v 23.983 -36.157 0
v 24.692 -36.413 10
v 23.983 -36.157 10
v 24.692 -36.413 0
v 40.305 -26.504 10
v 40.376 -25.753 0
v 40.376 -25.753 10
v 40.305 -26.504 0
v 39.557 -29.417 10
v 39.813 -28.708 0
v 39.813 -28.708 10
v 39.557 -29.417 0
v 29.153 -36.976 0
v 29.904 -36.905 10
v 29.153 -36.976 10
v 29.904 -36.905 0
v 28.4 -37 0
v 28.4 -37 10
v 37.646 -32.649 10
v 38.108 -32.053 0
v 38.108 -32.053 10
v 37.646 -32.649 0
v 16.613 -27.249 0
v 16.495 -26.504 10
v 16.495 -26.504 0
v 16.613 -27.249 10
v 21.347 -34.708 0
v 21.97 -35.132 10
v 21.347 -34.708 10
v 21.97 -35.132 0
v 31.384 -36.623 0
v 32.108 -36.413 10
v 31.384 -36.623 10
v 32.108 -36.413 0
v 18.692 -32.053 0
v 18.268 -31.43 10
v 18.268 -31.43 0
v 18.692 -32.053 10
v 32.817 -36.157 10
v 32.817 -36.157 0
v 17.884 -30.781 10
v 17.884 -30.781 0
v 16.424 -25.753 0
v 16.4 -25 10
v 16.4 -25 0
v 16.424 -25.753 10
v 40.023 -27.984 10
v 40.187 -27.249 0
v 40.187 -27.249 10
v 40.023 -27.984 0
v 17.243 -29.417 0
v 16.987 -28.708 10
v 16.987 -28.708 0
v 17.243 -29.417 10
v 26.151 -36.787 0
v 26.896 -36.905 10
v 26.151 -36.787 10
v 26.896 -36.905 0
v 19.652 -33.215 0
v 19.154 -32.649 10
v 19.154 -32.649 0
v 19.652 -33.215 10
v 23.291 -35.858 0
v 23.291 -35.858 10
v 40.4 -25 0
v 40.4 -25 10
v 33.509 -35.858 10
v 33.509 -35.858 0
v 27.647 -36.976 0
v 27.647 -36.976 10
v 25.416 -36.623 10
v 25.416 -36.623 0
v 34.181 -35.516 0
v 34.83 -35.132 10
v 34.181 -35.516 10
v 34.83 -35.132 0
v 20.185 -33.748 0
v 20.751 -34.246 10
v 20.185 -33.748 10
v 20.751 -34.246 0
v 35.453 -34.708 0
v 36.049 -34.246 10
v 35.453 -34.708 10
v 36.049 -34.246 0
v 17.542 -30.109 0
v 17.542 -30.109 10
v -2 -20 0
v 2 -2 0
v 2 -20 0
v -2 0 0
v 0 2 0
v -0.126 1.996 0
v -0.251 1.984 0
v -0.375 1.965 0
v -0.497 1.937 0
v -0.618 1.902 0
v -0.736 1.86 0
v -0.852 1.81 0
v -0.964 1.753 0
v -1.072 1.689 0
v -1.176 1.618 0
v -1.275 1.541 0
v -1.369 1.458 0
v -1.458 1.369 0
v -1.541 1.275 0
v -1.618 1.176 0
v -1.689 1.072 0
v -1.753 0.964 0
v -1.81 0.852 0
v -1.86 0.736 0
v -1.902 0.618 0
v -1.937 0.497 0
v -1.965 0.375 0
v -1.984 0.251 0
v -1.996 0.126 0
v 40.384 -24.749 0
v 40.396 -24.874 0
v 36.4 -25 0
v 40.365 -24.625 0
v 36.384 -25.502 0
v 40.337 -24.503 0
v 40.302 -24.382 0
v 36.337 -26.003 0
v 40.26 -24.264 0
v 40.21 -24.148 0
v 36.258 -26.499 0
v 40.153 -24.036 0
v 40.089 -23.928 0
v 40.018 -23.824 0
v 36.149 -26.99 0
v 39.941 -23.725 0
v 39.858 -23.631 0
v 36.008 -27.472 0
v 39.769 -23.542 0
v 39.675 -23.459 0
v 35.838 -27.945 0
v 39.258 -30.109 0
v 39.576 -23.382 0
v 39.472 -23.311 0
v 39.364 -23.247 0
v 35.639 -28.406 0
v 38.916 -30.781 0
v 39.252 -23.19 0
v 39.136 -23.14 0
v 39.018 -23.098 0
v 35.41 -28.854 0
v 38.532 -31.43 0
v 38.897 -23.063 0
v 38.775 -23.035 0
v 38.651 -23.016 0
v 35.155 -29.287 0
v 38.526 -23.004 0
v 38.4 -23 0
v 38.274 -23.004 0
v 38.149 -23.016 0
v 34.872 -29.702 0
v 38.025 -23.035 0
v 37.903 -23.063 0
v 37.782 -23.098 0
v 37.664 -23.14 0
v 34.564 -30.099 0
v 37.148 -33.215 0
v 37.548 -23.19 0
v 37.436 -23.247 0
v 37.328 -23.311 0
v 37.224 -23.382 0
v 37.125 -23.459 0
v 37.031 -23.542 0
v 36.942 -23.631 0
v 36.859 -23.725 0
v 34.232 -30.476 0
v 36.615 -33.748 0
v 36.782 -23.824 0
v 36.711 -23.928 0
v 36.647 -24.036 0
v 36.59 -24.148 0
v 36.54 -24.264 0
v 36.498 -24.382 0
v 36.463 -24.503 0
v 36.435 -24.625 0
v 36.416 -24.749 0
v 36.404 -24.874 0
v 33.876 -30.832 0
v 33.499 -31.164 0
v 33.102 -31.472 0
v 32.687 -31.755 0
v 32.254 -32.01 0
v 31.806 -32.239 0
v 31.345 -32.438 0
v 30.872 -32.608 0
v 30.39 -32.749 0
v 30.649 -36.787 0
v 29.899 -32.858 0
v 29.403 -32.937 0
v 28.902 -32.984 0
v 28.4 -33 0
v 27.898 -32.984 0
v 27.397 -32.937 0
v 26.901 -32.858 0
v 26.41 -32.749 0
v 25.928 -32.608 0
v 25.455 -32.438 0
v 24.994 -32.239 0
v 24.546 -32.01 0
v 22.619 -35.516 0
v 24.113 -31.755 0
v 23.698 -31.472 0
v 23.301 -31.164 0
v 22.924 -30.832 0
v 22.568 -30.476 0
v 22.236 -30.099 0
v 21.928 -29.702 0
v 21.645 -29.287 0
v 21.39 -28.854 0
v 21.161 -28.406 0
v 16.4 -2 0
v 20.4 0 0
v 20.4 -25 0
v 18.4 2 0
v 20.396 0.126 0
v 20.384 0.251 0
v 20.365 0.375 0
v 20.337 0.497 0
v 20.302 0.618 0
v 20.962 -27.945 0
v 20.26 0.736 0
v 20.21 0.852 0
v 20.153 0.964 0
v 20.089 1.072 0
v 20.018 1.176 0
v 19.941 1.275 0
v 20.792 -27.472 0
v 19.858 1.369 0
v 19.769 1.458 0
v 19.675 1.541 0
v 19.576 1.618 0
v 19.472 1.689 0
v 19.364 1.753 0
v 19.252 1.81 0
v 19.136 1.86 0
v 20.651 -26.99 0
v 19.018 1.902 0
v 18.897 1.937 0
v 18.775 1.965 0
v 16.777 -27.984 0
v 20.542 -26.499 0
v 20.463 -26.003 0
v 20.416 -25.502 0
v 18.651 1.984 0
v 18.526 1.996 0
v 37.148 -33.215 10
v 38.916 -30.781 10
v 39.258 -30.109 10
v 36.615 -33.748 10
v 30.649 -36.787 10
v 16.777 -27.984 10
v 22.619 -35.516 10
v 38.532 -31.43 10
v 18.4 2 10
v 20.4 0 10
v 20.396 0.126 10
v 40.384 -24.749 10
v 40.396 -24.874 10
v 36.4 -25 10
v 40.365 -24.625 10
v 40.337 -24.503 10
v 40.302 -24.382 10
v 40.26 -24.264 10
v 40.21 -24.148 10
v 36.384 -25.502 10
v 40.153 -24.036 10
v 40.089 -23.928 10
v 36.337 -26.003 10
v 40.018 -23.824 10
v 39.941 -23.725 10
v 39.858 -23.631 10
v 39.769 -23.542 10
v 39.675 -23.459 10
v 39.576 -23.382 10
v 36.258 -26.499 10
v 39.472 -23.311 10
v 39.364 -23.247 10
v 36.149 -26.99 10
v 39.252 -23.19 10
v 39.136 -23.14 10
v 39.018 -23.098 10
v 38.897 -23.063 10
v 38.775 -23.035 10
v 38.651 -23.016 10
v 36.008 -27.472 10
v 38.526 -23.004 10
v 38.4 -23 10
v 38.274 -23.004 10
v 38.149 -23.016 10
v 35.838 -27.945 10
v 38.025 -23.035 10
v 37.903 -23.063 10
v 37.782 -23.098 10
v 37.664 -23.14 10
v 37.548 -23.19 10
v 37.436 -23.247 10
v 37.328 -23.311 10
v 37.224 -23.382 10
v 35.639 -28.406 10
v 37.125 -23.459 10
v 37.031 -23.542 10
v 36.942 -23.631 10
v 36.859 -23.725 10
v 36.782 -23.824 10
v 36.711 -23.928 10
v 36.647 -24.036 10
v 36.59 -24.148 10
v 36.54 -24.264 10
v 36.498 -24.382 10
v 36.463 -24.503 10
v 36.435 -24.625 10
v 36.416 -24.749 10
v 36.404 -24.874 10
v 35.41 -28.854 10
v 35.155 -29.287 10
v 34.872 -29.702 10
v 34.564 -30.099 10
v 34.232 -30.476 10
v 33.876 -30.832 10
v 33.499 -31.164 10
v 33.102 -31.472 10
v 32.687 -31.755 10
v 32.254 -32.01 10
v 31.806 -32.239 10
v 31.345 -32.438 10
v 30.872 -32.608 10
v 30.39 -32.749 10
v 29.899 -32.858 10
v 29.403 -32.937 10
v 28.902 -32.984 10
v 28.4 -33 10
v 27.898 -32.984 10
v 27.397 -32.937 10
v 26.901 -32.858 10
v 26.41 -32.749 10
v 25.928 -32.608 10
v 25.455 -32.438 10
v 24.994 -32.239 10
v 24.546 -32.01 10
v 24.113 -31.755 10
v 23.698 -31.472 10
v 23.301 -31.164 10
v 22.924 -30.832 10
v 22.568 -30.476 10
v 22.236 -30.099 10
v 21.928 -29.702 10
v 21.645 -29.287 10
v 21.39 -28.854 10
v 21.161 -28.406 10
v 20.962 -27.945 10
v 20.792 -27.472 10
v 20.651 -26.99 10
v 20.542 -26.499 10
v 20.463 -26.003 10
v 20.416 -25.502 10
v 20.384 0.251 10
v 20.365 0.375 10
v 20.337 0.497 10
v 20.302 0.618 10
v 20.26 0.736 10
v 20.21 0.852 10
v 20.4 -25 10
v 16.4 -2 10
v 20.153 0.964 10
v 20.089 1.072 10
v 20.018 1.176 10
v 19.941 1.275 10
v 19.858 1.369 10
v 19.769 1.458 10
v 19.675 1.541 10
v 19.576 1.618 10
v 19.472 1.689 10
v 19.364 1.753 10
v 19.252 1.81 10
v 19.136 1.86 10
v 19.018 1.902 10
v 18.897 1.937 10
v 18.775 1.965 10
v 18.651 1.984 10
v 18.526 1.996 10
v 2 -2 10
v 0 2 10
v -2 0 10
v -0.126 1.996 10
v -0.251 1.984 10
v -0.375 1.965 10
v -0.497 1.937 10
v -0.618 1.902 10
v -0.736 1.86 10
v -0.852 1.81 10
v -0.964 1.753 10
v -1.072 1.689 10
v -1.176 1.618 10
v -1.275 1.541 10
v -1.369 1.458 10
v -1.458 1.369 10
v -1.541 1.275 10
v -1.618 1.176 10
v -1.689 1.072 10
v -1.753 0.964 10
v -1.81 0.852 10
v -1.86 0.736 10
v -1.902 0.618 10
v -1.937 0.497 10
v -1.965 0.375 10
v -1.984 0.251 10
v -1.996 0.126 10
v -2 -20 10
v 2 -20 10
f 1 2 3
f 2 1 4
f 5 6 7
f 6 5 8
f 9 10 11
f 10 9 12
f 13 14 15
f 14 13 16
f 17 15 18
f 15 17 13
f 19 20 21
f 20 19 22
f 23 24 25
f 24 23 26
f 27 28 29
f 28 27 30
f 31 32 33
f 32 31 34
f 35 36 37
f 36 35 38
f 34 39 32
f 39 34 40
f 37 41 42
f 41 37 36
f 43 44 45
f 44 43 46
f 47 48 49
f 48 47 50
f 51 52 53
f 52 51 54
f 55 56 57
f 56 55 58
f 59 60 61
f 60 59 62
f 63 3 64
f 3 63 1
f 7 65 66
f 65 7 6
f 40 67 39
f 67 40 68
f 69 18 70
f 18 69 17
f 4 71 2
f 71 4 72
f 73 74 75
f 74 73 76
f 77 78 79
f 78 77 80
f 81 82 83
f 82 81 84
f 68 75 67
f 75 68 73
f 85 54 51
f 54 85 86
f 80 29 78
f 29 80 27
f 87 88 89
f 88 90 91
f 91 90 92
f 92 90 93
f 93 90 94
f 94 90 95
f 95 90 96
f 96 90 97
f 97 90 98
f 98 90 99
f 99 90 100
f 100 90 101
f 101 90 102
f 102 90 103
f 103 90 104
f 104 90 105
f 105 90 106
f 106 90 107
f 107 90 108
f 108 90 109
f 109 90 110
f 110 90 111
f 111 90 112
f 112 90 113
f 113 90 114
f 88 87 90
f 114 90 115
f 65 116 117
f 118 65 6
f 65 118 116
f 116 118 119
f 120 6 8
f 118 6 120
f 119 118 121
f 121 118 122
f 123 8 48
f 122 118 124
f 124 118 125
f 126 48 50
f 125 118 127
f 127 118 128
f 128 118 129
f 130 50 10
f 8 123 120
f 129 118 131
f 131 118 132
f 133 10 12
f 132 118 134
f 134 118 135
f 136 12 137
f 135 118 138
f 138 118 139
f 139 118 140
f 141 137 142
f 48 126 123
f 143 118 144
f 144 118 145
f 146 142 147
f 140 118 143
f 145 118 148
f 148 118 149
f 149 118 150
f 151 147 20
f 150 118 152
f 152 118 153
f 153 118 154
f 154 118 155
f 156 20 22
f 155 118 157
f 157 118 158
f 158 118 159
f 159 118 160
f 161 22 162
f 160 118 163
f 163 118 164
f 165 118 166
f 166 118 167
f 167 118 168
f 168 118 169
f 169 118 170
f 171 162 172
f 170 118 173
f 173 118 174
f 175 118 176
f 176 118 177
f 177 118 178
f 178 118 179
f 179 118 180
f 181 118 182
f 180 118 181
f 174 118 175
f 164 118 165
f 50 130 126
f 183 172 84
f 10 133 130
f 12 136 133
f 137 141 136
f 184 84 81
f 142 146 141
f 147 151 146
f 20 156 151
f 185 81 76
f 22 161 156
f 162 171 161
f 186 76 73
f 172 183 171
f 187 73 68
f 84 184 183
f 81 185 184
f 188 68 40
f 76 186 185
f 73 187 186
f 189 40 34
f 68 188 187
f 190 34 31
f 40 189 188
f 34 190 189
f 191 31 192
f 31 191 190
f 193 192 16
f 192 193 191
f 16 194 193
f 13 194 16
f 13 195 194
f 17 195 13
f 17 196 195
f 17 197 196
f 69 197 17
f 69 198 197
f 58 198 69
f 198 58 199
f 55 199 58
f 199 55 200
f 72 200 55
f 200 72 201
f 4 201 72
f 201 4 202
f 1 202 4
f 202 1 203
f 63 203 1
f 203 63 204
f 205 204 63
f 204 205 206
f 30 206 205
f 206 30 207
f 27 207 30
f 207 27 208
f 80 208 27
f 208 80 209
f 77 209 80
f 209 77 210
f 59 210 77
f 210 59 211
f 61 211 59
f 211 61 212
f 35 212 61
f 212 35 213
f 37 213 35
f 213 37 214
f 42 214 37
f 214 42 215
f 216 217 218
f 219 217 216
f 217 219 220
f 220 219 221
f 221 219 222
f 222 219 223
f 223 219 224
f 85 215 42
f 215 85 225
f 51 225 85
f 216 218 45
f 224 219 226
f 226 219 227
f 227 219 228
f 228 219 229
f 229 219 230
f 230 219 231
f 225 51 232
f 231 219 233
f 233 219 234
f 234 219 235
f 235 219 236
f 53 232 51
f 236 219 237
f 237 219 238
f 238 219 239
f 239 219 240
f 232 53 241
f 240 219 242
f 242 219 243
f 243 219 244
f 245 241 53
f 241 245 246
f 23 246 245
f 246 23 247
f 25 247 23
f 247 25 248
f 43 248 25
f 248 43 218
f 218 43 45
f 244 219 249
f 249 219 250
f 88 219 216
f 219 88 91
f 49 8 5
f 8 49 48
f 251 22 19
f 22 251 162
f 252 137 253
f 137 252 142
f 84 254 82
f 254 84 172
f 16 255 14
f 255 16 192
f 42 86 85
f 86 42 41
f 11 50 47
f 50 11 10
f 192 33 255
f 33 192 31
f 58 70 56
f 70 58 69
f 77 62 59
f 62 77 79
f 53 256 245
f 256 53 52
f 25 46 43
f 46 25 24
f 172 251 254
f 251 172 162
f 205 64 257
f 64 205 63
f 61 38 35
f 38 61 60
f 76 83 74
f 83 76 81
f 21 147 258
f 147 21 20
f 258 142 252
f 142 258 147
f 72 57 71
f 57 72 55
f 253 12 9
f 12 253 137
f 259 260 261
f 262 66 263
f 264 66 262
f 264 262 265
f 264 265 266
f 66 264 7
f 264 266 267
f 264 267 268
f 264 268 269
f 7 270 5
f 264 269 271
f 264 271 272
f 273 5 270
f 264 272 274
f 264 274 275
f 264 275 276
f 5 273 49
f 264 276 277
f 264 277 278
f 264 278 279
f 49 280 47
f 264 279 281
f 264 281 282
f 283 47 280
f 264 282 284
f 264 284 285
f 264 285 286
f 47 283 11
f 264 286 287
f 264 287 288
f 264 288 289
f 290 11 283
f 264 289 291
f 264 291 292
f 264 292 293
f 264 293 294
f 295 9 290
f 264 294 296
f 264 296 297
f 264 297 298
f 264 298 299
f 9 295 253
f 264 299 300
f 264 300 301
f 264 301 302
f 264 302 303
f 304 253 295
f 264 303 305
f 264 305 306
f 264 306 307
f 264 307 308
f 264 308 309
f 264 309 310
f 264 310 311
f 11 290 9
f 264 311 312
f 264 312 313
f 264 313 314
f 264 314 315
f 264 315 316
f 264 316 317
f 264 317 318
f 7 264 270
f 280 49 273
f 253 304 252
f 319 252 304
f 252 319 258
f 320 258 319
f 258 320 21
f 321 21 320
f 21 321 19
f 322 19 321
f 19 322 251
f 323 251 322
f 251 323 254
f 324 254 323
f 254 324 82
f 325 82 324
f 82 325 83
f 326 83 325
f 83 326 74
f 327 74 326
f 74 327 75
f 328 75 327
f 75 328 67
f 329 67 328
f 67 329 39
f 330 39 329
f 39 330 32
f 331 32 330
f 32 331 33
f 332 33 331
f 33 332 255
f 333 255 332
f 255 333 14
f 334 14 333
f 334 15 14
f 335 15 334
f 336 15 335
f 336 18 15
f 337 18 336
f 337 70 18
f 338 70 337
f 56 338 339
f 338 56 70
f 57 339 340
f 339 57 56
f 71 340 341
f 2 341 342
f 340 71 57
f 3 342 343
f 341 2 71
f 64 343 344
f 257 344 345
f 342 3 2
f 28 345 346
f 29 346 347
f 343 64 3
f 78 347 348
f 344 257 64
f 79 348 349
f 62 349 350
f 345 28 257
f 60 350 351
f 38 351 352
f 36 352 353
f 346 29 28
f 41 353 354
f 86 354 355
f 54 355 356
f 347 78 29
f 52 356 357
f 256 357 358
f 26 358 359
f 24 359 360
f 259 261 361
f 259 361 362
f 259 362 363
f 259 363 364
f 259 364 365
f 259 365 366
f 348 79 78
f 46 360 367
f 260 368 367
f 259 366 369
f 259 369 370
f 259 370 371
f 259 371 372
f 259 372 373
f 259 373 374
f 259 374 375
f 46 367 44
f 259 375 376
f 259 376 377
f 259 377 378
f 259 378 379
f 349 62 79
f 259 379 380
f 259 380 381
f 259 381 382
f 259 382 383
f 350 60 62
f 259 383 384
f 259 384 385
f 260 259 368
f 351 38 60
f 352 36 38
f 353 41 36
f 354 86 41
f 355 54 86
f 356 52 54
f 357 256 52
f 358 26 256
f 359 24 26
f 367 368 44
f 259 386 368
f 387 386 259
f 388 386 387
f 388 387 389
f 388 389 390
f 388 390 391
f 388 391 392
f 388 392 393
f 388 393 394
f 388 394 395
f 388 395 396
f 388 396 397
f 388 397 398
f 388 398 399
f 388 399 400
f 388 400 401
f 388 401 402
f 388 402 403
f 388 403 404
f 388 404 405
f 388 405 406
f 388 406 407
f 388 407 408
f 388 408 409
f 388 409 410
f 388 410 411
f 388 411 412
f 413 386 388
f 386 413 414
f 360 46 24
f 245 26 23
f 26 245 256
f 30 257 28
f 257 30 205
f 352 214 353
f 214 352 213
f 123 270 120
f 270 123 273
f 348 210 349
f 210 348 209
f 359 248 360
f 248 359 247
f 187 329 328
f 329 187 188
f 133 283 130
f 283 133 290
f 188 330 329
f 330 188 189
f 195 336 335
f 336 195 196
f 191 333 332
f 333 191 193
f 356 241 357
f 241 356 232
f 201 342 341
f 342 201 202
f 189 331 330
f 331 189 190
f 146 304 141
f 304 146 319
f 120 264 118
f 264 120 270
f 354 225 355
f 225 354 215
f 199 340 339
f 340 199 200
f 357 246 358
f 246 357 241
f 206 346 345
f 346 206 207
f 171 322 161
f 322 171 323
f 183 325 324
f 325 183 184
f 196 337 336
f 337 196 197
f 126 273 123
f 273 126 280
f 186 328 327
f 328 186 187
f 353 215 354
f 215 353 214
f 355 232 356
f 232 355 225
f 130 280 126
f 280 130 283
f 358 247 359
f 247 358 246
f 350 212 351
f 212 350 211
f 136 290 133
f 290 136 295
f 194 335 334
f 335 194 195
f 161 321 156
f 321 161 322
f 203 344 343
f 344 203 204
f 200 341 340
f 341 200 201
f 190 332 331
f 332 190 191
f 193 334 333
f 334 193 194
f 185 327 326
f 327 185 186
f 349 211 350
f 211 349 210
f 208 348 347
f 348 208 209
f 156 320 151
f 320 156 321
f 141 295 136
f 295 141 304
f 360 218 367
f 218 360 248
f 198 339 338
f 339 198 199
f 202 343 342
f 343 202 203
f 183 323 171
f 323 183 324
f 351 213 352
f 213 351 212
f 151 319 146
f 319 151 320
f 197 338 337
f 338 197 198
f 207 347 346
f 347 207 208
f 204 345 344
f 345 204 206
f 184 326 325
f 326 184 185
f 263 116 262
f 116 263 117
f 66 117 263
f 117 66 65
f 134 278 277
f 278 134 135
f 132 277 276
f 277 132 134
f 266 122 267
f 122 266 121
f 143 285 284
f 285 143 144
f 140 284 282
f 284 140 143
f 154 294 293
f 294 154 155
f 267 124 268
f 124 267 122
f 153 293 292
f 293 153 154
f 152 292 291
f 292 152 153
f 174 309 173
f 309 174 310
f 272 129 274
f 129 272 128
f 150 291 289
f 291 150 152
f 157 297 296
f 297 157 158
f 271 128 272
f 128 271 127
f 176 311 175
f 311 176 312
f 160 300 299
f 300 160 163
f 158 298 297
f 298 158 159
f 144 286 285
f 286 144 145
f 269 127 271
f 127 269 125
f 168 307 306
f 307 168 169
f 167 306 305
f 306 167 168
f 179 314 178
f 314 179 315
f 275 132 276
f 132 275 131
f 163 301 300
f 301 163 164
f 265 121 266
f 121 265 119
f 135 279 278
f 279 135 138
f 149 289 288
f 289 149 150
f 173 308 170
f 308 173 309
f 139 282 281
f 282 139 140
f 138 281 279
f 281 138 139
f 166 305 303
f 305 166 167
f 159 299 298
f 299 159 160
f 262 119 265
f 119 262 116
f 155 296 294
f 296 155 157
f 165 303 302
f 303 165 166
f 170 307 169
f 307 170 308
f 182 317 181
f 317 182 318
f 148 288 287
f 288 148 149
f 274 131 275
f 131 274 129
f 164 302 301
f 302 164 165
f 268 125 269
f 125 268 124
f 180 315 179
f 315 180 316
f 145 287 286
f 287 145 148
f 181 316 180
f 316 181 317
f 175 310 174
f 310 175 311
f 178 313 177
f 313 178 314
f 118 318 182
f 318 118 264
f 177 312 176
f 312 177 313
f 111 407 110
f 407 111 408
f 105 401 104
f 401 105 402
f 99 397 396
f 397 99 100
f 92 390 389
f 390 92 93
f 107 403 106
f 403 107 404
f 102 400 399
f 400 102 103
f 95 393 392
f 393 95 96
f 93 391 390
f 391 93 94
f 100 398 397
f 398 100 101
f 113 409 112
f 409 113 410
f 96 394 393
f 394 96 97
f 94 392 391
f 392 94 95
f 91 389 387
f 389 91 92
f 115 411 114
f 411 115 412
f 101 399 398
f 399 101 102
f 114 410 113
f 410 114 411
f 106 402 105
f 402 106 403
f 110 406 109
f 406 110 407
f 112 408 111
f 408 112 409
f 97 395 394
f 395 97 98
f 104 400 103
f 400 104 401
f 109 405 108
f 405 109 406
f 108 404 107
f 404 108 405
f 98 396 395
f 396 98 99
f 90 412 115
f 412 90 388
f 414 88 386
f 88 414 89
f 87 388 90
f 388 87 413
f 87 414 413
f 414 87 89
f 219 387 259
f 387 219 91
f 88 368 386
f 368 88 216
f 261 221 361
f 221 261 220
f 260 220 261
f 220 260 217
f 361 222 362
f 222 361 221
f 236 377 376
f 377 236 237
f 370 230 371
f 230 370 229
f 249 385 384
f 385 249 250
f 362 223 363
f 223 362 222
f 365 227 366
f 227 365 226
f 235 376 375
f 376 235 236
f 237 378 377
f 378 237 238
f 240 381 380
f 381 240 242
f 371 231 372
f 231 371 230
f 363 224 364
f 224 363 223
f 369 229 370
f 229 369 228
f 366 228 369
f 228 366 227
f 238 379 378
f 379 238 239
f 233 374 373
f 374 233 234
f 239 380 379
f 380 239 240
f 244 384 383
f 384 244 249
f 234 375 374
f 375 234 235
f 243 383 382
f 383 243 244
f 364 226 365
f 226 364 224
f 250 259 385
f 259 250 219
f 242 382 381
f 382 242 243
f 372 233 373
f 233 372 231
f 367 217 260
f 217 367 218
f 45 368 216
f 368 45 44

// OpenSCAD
// file: lib.scad
module round1_4(radius, width, height) {
  translate([0,radius-width/2,0])
  rotate([0, 0, -90])
  intersection() {
    difference() {
      cylinder(r=radius, h=height, center=false);
      translate([0,0,-1])cylinder(r=radius-width, h=height+2, center=false);
    }
    cube(size=radius*2);
  }
}

module round1_8(radius, width) {
  difference() {
  round1_4(radius, width);
  translate([0, radius, -1]) rotate([0, 0, -45]) cube([radius, radius, width + 2]);
  }
}

module flat_hanger(hookRadius, width, h, clamp) {
  rotate([0, 0, -90]) round1_4(hookRadius, width, h);

  translate([hookRadius-width/2+clamp/2, width/2-hookRadius, h/2])
    cube([clamp, width, h], center=true);

  translate([clamp+hookRadius/2, width/2-hookRadius, 0])
    rotate([0, 0, 0]) round1_4(hookRadius, width, h);

  translate([clamp+1.5*width, 0, 0])
    cylinder(d=width, h=h, center=false);

}

module round_hanger(hookRadius, width, h) {
  difference() {
    difference() {
      translate([(hookRadius-width/2),0,0]) cylinder(r=hookRadius, h=h);
      translate([(hookRadius-width/2),0,0]) cylinder(r=hookRadius-width, h=2*h+2, center=true);
    }

    translate([0, 0, -1]) cube([2*hookRadius, hookRadius+2, h+2], center=false);
  }


  translate([2*hookRadius-width, 0, 0])
    cylinder(d=width, h=h, center=false);
}
// main file
use <lib.scad>;

module hook(clamp, hookRadius, frontSide) {
  $fn=100;
  h=10;
  width=4;


  cylinder(d=width, h=h);
  /**
   * backside of clamp, going down a bit
   */
  backSide = 20;
  translate([0, -backSide/2, h/2]) cube([width,backSide,h], center=true);


  /* clamp=24.2; */
  // upper part of the clamp
  translate([(clamp+width)/2, 0, h/2]) cube([clamp+width,width,h], center=true);

  // frontside of the clamp
  translate([clamp+width, 0, 0]) cylinder(d=width, h=h);
  /* frontSide = 25; */
  translate([clamp+width, -frontSide/2, h/2]) cube([width,frontSide,h], center=true);

  /* hookRadius = 20; */

  translate([clamp+width, -frontSide, 0])
    round_hanger(hookRadius, width, h);
}

hook(14.4, 12, 25);
